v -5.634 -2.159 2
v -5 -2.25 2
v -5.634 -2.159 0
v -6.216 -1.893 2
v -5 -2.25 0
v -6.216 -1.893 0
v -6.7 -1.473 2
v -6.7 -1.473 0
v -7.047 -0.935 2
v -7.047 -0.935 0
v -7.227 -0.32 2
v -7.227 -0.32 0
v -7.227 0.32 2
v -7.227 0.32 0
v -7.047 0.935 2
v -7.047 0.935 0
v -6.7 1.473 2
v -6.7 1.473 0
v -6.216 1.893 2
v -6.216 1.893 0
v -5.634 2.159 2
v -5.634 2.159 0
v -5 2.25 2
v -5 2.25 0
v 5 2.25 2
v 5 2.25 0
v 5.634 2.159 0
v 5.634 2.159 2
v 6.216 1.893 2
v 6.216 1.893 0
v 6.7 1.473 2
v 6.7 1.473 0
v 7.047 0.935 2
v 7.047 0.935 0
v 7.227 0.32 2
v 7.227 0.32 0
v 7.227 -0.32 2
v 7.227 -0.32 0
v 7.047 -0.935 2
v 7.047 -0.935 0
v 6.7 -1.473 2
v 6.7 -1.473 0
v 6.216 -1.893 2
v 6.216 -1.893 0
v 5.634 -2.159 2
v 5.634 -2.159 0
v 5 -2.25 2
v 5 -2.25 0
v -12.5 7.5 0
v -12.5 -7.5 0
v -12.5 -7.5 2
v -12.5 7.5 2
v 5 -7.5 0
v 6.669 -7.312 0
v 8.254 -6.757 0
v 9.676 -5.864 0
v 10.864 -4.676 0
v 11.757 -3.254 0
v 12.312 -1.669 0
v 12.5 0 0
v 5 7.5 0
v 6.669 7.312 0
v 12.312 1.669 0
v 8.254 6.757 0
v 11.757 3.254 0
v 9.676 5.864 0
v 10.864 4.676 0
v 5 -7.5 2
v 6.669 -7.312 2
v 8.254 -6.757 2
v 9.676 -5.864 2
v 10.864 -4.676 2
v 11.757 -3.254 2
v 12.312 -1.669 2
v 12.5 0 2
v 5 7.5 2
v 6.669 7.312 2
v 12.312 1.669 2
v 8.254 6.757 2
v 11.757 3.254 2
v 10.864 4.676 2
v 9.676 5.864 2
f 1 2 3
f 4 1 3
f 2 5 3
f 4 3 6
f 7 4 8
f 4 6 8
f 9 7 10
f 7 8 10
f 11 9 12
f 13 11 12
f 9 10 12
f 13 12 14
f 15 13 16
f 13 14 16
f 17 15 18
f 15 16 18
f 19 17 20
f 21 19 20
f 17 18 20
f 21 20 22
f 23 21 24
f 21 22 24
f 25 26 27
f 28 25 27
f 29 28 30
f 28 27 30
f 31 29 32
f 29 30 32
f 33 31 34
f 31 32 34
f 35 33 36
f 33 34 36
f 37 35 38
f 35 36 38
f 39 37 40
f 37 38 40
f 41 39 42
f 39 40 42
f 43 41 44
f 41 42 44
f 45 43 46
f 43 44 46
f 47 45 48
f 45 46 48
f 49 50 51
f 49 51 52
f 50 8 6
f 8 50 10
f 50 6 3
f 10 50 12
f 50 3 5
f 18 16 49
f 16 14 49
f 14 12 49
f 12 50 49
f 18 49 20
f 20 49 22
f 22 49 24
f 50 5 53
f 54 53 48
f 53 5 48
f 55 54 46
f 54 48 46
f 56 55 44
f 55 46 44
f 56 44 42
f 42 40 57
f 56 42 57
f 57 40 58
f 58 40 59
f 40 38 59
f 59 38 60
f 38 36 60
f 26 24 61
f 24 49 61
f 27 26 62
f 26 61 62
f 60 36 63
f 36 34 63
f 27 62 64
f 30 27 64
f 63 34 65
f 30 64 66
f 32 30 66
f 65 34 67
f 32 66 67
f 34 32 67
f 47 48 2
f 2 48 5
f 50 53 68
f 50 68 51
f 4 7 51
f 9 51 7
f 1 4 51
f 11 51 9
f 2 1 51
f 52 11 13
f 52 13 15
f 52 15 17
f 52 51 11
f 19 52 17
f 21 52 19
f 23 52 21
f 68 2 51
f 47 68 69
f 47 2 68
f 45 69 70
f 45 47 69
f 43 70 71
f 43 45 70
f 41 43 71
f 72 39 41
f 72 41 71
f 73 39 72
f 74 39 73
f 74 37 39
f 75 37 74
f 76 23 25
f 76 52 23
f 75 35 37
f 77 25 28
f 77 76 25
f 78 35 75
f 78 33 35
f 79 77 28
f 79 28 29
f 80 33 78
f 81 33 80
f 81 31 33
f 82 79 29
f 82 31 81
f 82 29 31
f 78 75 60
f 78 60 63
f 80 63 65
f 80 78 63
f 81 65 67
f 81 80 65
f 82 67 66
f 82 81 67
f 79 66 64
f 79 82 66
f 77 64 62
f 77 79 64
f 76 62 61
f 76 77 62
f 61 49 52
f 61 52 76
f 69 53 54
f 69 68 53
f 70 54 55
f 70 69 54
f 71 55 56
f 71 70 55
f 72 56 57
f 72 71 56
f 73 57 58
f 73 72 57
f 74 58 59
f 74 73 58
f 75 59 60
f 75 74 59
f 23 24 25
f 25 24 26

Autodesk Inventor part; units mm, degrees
ref_plane "YZ Plane" through (0, 0, 0) normal (1, 0, 0) x (0, 1, 0)
ref_plane "XZ Plane" through (0, 0, 0) normal (0, 1, 0) x (-1, 0, 0)
ref_plane "XY Plane" through (0, 0, 0) normal (0, 0, 1) x (1, 0, 0)
sketch "Skizze1" plane through (0, 0, 0) normal (0, 0, 1) x (1, 0, 0)
  line L0 (-17.5, 0) -> (17.5, 0) projected
  line L1 (0, -10.5) -> (0, 10.5) projected
  line L2 (12.5, -7.5) -> (-12.5, -7.5)
  line L3 (-12.5, -7.5) -> (-12.5, 7.5)
  line L4 (-12.5, 7.5) -> (12.5, 7.5)
  line L5 (12.5, 7.5) -> (12.5, -7.5)
  line L6 (12.5, -7.5) -> (-12.5, 7.5) construction
  line L7 (-12.5, -7.5) -> (12.5, 7.5) construction
  point P0 (0, 0)
  dimension "d0" = 15
  dimension "d1" = 25
extrude "Extrusion1" add sketch "Skizze1" along normal blind 2
fillet "Rundung1" radius 7.5 2 edges at (12.5, -7.5, 1) (12.5, 7.5, 1)
sketch "Skizze2" plane through (0, 0, 0) normal (0, 0, -1) x (-1, 0, 0)
  line L0 (17.5, 0) -> (-17.5, 0) projected
  line L1 (0, -10.5) -> (0, 10.5) projected
  line L2 (5, 0) -> (-5, 0) construction
  line L3 (5, 2.25) -> (-5, 2.25)
  line L4 (-5, -2.25) -> (5, -2.25)
  arc A0 (5, -2.25) -> (5, 2.25) centre (5, 0) ccw
  arc A1 (-5, 2.25) -> (-5, -2.25) centre (-5, 0) ccw
  point P0 (0, 0)
  dimension "d5" = 4.5
  dimension "d6" = 10
extrude "Extrusion2" cut sketch "Skizze2" against normal through all
properties part number "24_0497_0019"
